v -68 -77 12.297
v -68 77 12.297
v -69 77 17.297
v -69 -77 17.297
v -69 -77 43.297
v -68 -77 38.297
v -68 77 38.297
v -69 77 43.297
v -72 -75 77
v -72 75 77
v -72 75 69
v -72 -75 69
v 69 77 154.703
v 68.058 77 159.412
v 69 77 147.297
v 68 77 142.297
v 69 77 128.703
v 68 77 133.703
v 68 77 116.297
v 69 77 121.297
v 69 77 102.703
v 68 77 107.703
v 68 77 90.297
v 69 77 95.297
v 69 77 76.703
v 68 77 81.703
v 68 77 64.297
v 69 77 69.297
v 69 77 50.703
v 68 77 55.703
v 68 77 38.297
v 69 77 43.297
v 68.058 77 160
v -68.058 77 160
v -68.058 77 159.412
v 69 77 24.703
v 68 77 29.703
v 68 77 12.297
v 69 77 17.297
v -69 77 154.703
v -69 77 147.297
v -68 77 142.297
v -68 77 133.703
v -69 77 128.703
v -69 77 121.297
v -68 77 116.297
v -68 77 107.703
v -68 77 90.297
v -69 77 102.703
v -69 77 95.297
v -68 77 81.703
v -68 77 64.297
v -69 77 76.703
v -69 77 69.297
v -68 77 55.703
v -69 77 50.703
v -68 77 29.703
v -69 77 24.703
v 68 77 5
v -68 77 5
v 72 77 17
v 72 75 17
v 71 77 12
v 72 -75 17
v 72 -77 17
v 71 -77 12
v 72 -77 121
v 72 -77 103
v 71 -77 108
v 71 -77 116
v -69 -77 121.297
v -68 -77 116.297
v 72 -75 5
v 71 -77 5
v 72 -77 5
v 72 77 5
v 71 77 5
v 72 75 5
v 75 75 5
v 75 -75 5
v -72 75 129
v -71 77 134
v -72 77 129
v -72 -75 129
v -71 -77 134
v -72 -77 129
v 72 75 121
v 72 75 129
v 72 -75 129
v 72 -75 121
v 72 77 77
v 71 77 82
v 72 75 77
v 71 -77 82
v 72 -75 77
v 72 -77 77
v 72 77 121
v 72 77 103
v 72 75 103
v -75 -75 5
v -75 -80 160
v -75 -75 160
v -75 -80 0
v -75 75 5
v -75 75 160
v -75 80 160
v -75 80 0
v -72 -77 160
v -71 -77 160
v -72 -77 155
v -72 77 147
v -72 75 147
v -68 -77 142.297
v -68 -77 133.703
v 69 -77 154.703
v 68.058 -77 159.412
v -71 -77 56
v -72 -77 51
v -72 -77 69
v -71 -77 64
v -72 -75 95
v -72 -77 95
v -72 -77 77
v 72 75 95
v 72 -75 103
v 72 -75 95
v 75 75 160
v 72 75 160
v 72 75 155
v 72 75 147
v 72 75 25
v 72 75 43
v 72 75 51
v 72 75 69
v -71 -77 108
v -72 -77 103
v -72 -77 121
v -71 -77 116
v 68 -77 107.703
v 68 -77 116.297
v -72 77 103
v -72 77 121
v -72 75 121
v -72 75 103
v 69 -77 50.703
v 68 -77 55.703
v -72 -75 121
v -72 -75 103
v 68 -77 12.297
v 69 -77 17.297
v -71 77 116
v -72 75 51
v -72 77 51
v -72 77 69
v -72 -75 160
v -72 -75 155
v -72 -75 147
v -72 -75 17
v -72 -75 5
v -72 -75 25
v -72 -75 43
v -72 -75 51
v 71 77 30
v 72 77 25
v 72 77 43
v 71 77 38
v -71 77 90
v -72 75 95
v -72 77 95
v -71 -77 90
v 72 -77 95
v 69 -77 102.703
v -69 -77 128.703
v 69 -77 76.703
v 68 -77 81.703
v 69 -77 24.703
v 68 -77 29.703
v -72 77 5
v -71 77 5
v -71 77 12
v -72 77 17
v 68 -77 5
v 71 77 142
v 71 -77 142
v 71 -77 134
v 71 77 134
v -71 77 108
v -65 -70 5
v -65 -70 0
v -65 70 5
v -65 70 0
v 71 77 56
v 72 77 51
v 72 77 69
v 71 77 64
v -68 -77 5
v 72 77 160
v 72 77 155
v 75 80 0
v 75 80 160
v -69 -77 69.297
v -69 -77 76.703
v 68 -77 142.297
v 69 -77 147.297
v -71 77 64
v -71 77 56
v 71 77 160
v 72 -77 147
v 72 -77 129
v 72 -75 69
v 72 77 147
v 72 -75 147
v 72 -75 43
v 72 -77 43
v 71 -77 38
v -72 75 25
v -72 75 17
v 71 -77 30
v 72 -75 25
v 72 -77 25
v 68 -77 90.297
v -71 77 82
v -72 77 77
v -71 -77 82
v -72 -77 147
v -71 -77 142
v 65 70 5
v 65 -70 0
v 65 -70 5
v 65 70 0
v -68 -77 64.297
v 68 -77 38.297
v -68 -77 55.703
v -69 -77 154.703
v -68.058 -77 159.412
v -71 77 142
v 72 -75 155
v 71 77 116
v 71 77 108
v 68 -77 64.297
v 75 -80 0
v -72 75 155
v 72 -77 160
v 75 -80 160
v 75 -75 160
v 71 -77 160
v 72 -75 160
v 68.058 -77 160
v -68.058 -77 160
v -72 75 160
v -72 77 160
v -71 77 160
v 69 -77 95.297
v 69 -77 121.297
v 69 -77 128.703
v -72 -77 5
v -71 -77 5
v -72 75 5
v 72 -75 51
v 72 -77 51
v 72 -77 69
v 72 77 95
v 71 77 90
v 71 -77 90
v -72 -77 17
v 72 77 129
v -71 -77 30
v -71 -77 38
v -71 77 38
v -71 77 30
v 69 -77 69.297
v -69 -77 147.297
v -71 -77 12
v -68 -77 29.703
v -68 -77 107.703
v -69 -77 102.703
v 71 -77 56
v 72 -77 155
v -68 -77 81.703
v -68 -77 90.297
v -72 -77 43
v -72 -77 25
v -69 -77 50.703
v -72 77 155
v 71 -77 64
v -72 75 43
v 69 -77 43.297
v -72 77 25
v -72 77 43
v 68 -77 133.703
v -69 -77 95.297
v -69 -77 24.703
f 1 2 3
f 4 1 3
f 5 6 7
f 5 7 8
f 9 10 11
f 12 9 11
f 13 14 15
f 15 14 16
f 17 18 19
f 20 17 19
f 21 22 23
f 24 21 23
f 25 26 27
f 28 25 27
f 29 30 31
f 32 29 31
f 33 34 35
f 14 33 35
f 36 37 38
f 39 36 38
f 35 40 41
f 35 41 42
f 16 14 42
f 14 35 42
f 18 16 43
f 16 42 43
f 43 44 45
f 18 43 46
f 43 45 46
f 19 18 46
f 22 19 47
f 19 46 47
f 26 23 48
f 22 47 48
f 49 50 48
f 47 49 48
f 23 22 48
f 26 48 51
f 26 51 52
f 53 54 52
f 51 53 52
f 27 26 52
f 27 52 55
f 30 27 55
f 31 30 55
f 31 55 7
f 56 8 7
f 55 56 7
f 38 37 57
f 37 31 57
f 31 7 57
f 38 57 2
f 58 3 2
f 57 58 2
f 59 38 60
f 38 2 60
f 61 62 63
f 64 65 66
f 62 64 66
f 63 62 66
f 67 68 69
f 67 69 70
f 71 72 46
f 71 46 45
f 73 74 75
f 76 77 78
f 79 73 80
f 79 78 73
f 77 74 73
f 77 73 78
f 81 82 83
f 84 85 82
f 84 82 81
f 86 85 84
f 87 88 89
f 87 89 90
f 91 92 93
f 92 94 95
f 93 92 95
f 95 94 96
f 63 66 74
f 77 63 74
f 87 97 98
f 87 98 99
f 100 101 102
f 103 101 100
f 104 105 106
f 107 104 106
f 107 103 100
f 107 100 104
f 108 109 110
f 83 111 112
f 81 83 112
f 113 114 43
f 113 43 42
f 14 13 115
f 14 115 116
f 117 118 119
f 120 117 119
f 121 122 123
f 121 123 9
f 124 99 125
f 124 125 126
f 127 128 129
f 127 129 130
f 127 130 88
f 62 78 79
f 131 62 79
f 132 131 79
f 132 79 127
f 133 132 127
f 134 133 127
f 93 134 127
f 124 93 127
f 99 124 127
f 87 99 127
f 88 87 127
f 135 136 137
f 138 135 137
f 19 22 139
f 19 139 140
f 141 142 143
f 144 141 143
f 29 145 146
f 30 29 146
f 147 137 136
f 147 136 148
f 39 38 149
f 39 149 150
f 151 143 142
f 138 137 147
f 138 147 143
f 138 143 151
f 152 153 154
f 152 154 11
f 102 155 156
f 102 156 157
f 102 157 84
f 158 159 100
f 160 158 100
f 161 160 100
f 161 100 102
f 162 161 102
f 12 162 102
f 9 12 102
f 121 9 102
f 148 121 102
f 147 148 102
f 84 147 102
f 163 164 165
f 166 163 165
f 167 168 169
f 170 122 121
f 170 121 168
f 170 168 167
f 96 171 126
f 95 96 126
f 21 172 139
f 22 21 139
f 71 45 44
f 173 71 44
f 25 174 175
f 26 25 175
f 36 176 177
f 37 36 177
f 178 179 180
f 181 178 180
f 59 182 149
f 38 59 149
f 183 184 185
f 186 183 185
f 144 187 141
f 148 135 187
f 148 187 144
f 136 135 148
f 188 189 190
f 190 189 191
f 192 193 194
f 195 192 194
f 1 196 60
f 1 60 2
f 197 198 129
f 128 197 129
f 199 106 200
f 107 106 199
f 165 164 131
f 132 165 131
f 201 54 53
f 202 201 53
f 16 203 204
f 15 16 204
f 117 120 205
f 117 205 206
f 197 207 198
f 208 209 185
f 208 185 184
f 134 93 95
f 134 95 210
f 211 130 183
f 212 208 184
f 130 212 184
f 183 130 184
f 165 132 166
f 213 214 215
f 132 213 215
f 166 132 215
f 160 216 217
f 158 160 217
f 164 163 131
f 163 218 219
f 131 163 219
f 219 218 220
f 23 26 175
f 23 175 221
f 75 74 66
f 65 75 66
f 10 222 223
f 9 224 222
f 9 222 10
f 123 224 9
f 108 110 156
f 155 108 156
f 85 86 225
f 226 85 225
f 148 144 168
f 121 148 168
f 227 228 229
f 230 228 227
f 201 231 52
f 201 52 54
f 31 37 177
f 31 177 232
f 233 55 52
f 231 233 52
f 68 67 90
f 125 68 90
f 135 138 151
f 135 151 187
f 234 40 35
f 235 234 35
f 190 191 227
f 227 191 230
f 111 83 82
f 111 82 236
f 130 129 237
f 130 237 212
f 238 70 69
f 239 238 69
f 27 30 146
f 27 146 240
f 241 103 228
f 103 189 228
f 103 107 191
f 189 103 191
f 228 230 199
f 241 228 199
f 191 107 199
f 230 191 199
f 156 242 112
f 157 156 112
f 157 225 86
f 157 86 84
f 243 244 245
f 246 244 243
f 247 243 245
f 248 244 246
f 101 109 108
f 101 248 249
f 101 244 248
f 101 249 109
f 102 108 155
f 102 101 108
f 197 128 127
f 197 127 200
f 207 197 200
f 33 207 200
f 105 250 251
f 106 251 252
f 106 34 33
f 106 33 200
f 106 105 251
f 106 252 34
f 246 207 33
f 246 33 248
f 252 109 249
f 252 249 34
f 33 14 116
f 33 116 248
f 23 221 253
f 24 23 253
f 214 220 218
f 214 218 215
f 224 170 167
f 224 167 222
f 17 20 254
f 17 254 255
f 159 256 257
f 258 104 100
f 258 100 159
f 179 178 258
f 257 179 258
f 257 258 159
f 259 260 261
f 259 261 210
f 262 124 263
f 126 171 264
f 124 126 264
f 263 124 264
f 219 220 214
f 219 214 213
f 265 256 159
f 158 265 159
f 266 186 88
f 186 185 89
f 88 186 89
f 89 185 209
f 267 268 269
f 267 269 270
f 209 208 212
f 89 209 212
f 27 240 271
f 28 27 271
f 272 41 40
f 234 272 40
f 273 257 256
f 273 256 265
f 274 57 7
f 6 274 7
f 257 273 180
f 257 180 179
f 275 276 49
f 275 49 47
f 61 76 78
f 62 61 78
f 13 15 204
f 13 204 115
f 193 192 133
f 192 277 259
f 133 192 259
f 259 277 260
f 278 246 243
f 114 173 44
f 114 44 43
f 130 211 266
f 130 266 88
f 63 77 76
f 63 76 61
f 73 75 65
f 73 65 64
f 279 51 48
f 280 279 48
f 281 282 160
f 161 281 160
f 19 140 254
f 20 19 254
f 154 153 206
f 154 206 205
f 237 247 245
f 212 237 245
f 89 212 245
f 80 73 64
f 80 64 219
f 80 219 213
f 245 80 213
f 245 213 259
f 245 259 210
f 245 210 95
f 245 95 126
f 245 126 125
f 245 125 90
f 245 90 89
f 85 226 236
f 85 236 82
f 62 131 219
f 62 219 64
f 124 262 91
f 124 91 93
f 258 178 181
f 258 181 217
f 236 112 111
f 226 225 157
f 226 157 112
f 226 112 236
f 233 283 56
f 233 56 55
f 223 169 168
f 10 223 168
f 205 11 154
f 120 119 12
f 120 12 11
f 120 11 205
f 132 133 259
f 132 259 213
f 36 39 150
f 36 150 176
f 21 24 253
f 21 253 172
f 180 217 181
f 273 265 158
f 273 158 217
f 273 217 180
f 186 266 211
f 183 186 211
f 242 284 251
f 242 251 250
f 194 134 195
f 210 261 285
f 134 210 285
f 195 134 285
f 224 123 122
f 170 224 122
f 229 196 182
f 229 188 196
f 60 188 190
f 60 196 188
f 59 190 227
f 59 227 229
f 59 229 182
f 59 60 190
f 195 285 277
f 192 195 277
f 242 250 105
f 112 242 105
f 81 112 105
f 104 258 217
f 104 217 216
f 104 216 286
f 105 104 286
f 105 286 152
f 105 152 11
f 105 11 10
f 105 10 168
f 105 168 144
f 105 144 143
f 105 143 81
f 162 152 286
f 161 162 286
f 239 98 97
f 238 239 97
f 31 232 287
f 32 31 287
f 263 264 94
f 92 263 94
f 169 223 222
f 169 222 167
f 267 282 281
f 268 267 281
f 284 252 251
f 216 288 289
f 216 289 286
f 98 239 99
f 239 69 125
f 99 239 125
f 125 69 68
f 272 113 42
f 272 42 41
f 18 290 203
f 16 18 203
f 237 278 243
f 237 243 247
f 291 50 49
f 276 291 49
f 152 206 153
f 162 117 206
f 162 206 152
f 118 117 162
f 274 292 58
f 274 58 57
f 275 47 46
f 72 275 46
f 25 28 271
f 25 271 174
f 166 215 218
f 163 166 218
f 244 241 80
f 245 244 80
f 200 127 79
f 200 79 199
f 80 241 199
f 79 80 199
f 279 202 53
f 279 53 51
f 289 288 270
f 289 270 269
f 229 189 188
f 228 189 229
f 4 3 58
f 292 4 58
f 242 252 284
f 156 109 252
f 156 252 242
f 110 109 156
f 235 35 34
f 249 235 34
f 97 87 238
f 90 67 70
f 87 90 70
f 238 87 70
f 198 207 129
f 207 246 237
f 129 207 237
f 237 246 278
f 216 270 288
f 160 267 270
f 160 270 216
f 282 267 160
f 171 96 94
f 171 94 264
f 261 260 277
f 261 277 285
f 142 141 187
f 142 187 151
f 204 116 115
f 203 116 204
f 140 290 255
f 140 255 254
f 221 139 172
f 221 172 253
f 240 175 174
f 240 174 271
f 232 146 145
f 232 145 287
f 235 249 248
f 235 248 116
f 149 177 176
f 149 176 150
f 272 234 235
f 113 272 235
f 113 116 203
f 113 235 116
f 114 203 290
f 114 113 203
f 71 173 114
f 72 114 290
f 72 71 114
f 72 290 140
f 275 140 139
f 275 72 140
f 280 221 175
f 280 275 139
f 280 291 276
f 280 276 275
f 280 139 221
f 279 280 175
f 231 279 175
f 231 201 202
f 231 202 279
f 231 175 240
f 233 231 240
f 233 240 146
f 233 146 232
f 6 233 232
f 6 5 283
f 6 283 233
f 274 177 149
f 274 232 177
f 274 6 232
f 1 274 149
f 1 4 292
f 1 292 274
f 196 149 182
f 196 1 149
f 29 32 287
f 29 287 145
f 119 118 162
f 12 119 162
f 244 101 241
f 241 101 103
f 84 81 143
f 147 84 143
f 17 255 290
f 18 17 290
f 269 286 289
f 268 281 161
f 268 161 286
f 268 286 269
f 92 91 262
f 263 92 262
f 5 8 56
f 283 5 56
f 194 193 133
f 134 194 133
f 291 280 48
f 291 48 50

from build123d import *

# Parameters (mm, degrees)
SKETCH1_W           = 150
SKETCH1_H           = 160
SKETCH1_W_2         = 130
SKETCH1_H_2         = 140
BOSS_EXTRUDE1_DEPTH = 5
BOSS_EXTRUDE2_DEPTH = 155
BOSS_EXTRUDE3_DEPTH = 154
SKETCH4_W           = 155
SKETCH4_H           = 3
BOSS_EXTRUDE4_DEPTH = 140
SKETCH5_W           = 155
SKETCH5_H           = 3
BOSS_EXTRUDE5_DEPTH = 140


with BuildPart() as part:
    # Sketch1 → Boss-Extrude1 (new body)
    with BuildSketch(Plane.XY):
        Rectangle(SKETCH1_W, SKETCH1_H)
        Rectangle(SKETCH1_W_2, SKETCH1_H_2, mode=Mode.SUBTRACT)
    extrude(amount=BOSS_EXTRUDE1_DEPTH)

    # Sketch2 → Boss-Extrude2 (add)
    with BuildSketch(Plane.XY.offset(5)):
        Polygon((-75, 80), (-70, 80), (-70, 77), (-72, 77), (-72, 75), (-75, 75), align=None)
        Polygon((72, 75), (75, 75), (75, 80), (70, 80), (70, 77), (72, 77), align=None)
        Polygon((75, -75), (75, -80), (70, -80), (70, -77), (72, -77), (72, -75), align=None)
        Polygon((-70, -80), (-70, -77), (-72, -77), (-72, -75), (-75, -75), (-75, -80), align=None)
    extrude(amount=BOSS_EXTRUDE2_DEPTH)

    # Sketch3 → Boss-Extrude3 (add)
    with BuildSketch(Plane(origin=(0, -77, 0), x_dir=(1, 0, 0), z_dir=(0, 1, 0))):
        Polygon((-71, -160), (-72, -155), (-72, -147), (-71, -142), (-71, -134), (-72, -129), (-72, -121), (-71, -116), (-71, -108), (-72, -103), (-72, -95), (-71, -90), (-71, -82), (-72, -77), (-72, -69), (-71, -64), (-71, -56), (-72, -51), (-72, -43), (-71, -38), (-71, -30), (-72, -25), (-72, -17), (-71, -12), (-71, -5), (-68, -5), (-68, -12.297058541), (-69, -17.297058541), (-69, -24.702941459), (-68, -29.702941459), (-68, -38.297058541), (-69, -43.297058541), (-69, -50.702941459), (-68, -55.702941459), (-68, -64.297058541), (-69, -69.297058541), (-69, -76.702941459), (-68, -81.702941459), (-68, -90.297058541), (-69, -95.297058541), (-69, -102.702941459), (-68, -107.702941459), (-68, -116.297058541), (-69, -121.297058541), (-69, -128.702941459), (-68, -133.702941459), (-68, -142.297058541), (-69, -147.297058541), (-69, -154.702941459), (-68.058257973, -159.411651595), (-68.058257973, -160), align=None)
    boss_extrude3 = extrude(amount=BOSS_EXTRUDE3_DEPTH)

    # Mirror1: Boss-Extrude3 across plane
    add(boss_extrude3.mirror(Plane(origin=(0, 0, 0), x_dir=(0, 0, 1), z_dir=(1, 0, 0))))

    # Sketch4 → Boss-Extrude4 (add)
    with BuildSketch(Plane(origin=(-70, 0, 0), x_dir=(0, 0, -1), z_dir=(1, 0, 0))):
        with Locations((-82.5, 78.5)):
            Rectangle(SKETCH4_W, SKETCH4_H)
    extrude(amount=BOSS_EXTRUDE4_DEPTH)

    # Sketch5 → Boss-Extrude5 (add)
    with BuildSketch(Plane(origin=(-70, 0, 0), x_dir=(0, 0, -1), z_dir=(1, 0, 0))):
        with Locations((-82.5, -78.5)):
            Rectangle(SKETCH5_W, SKETCH5_H)
    extrude(amount=BOSS_EXTRUDE5_DEPTH)


solid = part.part
